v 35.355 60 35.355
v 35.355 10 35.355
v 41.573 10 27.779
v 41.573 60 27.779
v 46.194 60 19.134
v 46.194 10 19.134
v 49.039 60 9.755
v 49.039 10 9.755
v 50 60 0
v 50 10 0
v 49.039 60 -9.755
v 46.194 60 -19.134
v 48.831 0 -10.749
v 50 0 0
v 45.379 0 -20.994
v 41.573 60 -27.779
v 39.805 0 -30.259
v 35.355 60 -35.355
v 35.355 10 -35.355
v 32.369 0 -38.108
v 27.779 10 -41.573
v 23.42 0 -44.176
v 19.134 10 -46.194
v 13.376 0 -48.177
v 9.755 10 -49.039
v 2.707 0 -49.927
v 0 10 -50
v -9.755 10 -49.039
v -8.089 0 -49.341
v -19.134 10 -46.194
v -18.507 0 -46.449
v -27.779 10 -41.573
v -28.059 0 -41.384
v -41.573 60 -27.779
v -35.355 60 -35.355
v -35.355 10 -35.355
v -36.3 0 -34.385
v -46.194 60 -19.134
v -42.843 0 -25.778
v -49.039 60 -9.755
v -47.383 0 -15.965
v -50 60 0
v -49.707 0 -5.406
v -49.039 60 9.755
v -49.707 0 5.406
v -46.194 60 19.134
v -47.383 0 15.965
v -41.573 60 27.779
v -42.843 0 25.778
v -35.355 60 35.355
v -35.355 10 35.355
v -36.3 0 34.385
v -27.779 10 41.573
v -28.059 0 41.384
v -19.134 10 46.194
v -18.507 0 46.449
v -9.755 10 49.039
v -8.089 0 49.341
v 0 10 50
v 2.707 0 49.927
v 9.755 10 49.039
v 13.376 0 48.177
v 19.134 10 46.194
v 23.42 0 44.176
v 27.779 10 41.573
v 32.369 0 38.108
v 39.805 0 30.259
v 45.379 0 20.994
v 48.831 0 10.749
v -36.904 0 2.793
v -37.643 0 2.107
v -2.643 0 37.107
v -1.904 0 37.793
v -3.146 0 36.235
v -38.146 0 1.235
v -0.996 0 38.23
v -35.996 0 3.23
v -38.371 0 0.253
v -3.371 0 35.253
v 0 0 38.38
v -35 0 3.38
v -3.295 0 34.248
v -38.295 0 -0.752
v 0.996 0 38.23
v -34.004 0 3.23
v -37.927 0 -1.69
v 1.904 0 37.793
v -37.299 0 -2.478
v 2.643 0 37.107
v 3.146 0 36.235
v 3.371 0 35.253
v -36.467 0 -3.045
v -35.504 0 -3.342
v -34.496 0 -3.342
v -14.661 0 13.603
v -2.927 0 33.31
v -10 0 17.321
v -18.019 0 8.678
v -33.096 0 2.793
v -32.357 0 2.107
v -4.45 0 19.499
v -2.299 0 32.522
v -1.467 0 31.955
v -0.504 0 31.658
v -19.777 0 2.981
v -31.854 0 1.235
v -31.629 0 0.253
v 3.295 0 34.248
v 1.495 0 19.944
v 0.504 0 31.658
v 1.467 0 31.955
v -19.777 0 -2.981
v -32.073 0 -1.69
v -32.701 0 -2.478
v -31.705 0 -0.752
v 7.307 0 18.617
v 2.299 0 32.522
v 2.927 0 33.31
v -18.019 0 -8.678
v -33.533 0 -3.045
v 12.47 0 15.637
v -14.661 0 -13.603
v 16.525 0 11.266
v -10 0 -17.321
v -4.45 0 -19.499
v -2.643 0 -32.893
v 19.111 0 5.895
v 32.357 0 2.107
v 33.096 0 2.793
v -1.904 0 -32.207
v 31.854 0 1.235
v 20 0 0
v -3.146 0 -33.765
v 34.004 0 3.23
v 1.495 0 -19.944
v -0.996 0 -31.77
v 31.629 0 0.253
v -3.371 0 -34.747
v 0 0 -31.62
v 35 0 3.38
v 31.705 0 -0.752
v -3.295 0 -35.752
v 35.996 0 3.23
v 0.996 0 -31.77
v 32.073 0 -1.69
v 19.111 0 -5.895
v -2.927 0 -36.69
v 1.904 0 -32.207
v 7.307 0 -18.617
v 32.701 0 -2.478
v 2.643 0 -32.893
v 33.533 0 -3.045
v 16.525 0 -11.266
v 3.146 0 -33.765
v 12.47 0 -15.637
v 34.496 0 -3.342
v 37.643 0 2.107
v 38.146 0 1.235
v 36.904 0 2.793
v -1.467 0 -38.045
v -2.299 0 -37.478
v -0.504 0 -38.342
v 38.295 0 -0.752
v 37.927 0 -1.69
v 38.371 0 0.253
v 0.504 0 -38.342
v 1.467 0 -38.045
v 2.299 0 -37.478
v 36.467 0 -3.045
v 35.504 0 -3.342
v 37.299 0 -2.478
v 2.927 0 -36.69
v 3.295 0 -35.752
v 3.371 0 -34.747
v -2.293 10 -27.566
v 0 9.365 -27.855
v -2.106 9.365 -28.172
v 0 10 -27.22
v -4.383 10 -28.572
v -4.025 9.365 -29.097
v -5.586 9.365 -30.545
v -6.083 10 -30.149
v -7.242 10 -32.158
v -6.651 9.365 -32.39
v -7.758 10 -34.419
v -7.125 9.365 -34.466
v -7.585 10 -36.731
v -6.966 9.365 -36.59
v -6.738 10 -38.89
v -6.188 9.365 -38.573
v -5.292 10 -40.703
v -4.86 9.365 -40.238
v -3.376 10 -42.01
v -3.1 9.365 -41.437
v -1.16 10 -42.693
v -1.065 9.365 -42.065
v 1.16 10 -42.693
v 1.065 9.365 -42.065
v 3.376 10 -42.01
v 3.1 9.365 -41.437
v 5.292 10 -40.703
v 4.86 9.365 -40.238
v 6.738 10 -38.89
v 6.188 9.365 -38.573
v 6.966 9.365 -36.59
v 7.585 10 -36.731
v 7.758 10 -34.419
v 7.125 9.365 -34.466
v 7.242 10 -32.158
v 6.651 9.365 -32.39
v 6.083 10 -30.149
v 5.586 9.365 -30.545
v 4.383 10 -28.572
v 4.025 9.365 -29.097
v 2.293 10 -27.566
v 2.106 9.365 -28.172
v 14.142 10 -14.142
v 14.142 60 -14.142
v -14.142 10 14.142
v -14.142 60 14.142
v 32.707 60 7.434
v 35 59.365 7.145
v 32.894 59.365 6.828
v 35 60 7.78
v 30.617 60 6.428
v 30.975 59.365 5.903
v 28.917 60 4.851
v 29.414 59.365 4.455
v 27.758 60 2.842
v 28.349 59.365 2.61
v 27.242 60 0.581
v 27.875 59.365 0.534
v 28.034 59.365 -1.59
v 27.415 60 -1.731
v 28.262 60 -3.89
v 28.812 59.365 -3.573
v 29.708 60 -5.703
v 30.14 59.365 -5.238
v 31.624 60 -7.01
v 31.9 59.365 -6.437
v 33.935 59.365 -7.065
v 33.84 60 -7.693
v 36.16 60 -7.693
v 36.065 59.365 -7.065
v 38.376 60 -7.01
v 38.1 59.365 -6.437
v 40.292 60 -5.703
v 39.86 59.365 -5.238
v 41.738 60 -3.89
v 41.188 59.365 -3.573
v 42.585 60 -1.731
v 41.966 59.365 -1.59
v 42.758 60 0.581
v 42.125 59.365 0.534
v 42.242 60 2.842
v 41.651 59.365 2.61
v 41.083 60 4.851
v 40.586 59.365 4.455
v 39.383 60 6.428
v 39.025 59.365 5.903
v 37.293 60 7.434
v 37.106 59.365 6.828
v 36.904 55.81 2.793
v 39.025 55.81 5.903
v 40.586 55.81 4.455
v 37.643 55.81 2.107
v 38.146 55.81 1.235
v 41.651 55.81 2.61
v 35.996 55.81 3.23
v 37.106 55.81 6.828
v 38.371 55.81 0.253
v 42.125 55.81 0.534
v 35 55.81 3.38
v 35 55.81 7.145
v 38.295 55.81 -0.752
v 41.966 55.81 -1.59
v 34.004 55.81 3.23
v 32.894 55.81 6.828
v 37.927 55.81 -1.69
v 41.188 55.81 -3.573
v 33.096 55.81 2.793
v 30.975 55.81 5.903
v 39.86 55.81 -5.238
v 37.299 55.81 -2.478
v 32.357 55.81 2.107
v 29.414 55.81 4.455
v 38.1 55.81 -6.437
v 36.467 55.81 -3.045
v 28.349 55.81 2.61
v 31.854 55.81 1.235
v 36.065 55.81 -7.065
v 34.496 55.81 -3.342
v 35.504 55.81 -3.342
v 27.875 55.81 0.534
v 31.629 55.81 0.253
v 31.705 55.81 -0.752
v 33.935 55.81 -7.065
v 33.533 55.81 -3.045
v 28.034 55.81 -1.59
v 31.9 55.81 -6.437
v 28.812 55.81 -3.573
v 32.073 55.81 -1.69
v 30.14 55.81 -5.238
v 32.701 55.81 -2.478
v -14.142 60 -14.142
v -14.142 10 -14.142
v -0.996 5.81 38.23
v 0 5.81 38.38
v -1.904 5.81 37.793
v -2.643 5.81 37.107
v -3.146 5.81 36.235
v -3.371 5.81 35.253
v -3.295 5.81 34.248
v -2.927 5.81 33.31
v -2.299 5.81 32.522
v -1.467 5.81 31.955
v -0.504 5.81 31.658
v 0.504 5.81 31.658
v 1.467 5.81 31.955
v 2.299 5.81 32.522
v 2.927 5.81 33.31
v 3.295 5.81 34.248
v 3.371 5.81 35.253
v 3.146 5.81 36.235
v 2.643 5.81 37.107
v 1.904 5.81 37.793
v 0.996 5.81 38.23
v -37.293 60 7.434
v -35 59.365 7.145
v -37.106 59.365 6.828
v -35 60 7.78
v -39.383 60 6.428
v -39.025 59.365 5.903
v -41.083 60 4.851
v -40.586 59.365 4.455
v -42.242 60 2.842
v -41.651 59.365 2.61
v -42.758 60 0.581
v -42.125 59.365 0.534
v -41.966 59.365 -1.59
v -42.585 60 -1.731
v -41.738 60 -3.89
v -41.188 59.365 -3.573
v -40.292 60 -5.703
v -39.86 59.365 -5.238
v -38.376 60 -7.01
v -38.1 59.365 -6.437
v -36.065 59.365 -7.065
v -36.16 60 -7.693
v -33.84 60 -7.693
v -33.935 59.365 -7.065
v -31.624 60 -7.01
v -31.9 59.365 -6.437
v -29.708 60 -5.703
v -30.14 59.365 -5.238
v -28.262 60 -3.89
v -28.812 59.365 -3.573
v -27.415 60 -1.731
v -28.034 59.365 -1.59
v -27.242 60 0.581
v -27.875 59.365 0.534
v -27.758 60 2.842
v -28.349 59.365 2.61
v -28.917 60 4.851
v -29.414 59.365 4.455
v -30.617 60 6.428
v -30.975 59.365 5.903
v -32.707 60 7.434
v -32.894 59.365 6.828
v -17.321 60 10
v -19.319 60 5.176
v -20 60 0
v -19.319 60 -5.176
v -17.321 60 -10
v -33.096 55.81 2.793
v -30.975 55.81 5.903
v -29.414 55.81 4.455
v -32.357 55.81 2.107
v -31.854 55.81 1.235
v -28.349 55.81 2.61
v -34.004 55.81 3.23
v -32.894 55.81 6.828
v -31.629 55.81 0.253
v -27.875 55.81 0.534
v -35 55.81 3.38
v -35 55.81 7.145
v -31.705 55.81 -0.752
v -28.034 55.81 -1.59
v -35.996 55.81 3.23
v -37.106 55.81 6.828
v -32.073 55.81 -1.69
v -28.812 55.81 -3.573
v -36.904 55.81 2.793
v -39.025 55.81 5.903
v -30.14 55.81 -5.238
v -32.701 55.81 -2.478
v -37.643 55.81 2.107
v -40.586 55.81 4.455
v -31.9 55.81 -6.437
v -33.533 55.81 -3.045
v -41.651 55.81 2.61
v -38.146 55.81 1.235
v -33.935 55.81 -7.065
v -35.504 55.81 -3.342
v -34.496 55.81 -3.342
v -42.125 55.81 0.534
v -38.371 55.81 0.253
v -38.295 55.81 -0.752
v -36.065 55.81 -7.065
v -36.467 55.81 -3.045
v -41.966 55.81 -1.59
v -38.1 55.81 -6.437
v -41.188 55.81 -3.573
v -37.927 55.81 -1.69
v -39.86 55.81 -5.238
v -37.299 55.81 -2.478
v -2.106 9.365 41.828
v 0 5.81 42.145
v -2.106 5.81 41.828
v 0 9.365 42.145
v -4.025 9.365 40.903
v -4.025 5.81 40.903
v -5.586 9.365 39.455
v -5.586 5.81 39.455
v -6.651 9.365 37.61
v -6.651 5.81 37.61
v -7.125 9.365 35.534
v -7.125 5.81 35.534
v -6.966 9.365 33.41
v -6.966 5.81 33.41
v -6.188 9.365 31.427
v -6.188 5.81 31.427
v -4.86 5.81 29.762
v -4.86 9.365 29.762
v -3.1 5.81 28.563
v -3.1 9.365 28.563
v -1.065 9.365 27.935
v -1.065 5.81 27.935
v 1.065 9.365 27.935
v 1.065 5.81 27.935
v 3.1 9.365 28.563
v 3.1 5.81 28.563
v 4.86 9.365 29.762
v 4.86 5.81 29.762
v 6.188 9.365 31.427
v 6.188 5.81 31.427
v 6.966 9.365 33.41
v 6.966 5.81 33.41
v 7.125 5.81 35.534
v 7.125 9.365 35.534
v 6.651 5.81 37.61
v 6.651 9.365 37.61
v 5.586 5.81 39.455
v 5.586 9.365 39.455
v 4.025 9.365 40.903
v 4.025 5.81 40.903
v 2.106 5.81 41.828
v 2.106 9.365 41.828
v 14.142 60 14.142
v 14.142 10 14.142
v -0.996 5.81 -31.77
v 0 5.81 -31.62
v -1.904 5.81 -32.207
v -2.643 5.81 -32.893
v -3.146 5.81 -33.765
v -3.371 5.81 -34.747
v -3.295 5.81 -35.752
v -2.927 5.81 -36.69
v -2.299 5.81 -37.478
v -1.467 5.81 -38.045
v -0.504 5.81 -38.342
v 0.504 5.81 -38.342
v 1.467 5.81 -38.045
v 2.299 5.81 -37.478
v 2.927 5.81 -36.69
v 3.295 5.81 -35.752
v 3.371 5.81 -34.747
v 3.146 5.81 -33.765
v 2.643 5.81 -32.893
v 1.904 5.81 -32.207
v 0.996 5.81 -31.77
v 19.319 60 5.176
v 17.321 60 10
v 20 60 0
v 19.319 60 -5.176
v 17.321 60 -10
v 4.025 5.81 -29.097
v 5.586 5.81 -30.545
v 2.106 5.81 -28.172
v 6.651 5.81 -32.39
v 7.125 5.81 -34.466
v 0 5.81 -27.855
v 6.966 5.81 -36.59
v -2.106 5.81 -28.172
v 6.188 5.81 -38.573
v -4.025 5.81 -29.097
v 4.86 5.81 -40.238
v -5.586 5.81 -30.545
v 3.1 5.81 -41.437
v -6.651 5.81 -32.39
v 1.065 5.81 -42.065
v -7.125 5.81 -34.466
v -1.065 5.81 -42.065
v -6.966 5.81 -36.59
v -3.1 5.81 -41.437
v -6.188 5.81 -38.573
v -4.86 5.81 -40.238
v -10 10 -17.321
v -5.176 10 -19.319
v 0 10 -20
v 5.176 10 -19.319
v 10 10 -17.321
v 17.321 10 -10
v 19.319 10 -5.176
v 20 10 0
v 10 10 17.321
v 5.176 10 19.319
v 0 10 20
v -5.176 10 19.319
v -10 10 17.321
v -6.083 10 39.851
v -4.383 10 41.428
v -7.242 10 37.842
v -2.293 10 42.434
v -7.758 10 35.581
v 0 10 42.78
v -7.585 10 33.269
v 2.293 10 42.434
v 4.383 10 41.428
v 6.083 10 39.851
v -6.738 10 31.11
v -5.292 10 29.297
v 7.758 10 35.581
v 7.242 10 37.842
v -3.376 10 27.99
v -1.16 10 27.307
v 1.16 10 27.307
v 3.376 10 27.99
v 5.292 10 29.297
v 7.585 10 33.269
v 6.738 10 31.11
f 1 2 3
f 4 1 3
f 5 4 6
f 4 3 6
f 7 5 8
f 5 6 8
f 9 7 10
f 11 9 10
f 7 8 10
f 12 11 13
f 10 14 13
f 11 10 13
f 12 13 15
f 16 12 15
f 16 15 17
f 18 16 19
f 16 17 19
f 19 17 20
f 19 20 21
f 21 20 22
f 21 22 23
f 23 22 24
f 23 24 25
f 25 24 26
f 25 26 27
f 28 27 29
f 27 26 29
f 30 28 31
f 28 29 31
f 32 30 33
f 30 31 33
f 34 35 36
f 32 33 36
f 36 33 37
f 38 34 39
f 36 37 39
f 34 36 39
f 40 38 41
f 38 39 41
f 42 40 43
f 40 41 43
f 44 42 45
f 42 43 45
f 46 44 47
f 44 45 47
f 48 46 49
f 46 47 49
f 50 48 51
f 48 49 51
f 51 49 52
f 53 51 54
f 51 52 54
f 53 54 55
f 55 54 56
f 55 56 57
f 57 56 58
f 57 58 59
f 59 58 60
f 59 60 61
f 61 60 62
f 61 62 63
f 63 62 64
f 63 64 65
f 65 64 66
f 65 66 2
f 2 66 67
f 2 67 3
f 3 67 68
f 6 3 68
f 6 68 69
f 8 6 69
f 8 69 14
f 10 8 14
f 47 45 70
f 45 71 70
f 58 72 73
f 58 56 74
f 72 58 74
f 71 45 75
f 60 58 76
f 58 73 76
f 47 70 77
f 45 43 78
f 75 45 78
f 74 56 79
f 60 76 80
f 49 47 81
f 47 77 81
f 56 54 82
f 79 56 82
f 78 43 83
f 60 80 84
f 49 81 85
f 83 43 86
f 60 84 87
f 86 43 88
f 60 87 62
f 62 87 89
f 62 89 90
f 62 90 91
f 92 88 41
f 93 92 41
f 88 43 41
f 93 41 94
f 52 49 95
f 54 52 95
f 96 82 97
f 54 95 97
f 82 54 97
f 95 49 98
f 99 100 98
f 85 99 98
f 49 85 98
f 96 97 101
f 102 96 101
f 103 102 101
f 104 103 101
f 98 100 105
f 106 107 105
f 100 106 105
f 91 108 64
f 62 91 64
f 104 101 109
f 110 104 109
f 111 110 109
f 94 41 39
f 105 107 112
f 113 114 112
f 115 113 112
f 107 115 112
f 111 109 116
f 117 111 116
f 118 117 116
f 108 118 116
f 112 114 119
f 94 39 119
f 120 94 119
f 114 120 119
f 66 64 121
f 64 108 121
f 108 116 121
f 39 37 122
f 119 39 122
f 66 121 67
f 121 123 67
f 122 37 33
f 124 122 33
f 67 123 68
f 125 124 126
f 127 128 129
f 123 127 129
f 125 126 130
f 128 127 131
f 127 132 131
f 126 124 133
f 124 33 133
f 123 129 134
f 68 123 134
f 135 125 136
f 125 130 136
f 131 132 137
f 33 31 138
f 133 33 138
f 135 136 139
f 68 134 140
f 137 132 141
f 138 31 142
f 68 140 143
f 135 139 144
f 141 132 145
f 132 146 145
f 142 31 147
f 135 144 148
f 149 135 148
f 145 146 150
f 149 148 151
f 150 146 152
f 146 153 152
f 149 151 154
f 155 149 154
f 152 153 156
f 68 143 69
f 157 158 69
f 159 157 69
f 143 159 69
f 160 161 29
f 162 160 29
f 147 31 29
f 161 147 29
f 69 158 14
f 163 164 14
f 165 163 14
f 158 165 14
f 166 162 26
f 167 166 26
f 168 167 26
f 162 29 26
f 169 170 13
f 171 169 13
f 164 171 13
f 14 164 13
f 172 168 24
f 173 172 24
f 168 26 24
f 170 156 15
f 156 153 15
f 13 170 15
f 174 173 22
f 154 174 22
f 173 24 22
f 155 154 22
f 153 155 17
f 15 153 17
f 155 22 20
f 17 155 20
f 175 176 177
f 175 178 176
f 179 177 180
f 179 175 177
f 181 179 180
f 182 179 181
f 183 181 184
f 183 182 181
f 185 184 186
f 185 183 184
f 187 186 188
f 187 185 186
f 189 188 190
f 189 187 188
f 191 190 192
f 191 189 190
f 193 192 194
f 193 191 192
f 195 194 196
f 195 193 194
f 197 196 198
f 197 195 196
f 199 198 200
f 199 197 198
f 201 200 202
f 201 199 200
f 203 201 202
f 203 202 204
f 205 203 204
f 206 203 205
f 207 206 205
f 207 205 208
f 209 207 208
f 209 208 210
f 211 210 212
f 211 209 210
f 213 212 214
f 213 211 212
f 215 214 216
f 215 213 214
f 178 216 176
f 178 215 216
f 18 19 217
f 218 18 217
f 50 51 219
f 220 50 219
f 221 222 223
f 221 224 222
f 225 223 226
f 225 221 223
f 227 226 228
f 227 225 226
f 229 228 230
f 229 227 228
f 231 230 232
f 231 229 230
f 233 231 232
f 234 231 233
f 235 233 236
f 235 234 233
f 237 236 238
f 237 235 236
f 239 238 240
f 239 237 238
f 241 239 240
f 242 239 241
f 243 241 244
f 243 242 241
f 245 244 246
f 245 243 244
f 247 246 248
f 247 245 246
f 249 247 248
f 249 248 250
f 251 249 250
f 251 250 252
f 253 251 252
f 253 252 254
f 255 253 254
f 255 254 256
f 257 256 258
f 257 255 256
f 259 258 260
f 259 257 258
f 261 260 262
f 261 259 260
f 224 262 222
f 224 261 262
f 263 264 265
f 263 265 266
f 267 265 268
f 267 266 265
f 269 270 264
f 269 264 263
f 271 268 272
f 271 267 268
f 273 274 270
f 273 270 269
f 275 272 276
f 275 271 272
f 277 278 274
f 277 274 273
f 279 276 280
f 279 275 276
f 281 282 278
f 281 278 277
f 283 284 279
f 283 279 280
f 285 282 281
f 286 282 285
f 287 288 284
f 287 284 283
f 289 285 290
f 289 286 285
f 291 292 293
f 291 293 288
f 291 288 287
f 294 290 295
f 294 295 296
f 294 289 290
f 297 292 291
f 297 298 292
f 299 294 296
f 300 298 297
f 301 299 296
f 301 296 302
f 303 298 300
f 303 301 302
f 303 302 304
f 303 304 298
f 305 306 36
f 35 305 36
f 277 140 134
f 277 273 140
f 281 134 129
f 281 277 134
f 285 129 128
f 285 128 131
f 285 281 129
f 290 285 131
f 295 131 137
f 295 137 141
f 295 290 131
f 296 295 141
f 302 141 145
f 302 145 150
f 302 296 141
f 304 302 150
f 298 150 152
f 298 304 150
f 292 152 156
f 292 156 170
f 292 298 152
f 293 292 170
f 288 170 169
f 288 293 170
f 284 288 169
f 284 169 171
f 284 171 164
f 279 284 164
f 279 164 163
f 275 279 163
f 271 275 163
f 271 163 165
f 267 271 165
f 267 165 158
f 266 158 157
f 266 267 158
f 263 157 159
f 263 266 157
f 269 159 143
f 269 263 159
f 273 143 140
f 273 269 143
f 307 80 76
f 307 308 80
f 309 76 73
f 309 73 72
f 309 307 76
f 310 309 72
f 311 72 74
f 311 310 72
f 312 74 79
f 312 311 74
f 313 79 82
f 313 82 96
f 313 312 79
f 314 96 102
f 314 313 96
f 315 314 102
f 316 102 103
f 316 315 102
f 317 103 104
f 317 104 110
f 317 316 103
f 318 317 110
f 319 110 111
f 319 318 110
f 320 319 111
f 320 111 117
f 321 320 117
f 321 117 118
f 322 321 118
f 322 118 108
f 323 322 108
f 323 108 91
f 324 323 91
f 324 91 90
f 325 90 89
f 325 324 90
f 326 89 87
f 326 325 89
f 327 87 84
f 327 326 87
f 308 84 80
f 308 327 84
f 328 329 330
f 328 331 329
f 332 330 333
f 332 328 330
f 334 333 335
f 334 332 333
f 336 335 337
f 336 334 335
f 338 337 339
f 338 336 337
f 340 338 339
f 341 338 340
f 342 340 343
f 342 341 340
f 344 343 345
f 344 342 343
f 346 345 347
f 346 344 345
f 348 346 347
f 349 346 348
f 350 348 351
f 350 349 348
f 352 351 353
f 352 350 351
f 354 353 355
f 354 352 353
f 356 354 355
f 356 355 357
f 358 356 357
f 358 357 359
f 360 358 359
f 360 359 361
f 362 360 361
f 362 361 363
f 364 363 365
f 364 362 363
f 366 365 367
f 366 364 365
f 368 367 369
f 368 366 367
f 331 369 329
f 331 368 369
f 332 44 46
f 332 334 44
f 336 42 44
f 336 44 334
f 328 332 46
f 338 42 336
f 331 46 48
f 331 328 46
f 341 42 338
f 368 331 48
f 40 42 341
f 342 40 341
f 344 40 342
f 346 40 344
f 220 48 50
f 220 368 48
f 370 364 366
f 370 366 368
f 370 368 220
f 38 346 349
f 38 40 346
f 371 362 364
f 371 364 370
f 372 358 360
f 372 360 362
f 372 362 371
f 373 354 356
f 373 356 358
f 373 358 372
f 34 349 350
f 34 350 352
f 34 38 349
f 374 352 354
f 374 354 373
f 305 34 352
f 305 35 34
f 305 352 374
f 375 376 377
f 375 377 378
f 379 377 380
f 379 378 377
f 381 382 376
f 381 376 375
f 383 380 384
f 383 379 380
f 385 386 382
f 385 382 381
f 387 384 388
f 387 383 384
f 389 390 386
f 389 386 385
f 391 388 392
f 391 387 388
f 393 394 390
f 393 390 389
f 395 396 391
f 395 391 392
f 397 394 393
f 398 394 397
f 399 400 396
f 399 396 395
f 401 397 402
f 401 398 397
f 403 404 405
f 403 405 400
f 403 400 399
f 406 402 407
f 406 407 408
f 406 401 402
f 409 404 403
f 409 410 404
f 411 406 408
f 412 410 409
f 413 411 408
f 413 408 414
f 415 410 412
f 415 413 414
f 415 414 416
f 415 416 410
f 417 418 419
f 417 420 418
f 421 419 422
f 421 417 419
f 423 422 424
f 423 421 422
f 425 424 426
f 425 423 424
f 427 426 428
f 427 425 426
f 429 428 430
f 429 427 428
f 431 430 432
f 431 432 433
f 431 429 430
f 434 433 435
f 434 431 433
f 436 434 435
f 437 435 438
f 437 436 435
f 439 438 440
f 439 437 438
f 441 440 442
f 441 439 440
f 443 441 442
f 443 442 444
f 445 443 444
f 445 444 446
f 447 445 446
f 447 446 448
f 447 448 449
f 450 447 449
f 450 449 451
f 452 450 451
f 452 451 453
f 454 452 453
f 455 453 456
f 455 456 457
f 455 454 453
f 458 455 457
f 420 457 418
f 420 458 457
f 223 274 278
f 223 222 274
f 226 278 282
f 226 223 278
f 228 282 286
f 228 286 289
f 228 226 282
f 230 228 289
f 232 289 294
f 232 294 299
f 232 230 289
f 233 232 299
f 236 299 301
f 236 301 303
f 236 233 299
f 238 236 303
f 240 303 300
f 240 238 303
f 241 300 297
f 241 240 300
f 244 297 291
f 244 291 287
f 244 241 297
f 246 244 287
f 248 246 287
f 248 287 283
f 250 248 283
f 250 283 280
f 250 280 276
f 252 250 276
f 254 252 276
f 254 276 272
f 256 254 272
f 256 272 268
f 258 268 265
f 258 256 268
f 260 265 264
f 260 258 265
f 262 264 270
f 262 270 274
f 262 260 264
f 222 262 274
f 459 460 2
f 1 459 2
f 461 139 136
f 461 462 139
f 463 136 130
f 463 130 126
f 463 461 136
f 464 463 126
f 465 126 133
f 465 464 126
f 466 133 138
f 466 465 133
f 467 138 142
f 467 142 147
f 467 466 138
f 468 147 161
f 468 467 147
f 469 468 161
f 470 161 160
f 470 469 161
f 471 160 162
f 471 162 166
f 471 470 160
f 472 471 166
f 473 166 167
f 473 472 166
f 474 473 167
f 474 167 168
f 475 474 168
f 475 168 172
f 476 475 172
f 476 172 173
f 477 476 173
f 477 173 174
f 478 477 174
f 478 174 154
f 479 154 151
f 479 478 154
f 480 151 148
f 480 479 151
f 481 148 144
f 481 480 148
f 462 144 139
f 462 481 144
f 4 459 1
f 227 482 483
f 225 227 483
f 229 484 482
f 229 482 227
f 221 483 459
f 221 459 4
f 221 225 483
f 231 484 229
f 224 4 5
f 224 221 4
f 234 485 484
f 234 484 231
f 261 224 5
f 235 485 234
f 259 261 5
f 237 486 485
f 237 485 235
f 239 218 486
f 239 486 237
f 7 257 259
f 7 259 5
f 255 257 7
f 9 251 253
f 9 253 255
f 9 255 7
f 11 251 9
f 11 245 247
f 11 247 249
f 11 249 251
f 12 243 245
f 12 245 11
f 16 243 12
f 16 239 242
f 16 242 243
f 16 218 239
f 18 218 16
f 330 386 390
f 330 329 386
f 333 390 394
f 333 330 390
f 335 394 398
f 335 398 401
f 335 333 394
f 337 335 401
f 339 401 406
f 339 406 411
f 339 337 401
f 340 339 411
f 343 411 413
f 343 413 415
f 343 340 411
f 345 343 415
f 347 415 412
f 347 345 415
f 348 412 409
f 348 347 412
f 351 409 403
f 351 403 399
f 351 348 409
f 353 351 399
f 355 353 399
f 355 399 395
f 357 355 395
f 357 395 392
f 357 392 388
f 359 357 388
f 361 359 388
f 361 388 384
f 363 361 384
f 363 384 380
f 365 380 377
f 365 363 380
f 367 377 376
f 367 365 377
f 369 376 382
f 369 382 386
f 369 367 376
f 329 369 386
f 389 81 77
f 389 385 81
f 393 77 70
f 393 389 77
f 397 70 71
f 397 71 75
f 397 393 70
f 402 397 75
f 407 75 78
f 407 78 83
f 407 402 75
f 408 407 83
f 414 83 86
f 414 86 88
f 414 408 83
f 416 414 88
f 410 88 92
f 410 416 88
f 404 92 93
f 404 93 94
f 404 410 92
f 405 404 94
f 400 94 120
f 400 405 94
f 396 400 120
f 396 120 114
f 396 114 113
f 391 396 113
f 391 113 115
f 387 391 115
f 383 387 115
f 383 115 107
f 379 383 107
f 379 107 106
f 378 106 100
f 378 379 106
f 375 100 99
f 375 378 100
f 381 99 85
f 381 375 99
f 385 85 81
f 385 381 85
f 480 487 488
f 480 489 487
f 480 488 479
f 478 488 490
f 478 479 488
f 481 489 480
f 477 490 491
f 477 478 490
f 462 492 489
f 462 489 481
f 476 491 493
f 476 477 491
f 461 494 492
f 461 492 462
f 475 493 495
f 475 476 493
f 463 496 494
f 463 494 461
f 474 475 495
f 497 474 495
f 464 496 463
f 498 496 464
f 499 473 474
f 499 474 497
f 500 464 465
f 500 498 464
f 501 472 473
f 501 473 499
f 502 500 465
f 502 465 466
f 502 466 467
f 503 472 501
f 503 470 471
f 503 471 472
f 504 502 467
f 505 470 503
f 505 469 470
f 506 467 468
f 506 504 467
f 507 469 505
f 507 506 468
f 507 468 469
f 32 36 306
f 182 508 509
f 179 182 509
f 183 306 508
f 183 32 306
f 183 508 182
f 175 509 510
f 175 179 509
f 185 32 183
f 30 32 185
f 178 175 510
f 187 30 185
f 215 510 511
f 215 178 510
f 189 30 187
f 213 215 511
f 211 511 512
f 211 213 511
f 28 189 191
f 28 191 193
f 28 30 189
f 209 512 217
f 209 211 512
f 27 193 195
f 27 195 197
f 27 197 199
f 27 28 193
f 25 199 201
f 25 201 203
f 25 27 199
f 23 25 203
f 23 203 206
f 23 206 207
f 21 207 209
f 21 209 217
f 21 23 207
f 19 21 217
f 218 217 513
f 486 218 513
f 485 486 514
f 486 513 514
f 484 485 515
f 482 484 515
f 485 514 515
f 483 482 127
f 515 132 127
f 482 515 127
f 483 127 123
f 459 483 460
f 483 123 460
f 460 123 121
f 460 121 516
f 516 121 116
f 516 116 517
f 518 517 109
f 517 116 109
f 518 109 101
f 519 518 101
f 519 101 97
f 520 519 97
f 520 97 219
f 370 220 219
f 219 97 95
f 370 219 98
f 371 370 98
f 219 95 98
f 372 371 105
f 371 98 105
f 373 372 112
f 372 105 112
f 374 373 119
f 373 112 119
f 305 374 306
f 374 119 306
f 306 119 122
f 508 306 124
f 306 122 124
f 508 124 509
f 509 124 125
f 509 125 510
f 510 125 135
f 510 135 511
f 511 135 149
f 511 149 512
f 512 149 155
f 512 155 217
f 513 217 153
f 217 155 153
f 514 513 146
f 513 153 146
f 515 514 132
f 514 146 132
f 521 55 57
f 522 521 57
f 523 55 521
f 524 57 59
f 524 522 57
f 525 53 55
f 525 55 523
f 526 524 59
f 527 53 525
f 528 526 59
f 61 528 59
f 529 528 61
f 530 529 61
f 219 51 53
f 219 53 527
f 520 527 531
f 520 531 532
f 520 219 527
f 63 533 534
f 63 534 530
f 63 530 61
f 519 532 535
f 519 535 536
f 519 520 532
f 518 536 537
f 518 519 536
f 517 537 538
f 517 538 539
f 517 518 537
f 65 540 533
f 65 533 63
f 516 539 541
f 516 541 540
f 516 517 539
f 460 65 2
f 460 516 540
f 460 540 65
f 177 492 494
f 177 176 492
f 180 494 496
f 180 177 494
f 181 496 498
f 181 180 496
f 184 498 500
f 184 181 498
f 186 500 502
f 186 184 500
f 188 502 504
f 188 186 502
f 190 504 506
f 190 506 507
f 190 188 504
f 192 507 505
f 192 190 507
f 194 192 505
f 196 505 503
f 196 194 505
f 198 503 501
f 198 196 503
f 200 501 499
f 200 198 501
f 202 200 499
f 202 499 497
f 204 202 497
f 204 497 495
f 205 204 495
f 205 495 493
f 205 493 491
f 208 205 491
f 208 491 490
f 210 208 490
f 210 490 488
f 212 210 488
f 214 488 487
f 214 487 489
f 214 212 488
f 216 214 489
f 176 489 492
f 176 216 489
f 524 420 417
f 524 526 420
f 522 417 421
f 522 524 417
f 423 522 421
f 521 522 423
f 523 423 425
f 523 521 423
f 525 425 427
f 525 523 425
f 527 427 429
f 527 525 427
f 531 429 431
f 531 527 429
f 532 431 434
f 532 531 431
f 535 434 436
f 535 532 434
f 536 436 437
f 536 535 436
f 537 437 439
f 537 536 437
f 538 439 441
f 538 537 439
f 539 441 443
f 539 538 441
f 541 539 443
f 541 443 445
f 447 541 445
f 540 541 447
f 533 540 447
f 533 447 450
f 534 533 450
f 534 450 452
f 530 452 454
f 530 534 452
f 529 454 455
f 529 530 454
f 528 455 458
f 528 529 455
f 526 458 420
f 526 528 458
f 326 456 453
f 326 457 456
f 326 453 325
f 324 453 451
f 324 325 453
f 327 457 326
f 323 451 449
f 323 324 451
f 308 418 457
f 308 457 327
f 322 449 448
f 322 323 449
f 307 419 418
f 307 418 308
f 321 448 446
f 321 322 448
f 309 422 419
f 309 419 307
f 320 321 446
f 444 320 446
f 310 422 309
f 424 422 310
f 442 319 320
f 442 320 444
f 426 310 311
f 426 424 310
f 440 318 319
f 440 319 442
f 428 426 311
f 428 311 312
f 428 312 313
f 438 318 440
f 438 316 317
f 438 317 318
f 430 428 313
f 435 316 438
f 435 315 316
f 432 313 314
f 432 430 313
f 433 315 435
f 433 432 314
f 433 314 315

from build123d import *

# Parameters (mm, degrees)
SKETCH3_R                              = 50
BOSS_EXTRUDE1_DEPTH                    = 10
SKETCH4_R                              = 20
CUT_EXTRUDE3_DEPTH                     = 10
BOSS_EXTRUDE3_DEPTH                    = 50
CBORE_FOR_M6_HEX_HEAD_BOLT1_AT_2_COUNT = 2
CBORE_FOR_M6_HEX_HEAD_BOLT1_AT_2_PITCH = 70
CBORE_FOR_M6_HEX_HEAD_BOLT4_AT_2_COUNT = 2
CBORE_FOR_M6_HEX_HEAD_BOLT4_AT_2_PITCH = 70


with BuildPart() as part:
    # Sketch3 → Boss-Extrude1 (new body)
    with BuildSketch(Plane(origin=(0, 0, 0), x_dir=(1, 0, 0), z_dir=(0, 1, 0))):
        Circle(SKETCH3_R)
    extrude(amount=BOSS_EXTRUDE1_DEPTH)

    # Sketch4 → Cut-Extrude3 (cut)
    with BuildSketch(Plane(origin=(0, 10, 0), x_dir=(1, 0, 0), z_dir=(0, 1, 0))):
        Circle(SKETCH4_R)
    extrude(amount=-CUT_EXTRUDE3_DEPTH, mode=Mode.SUBTRACT)

    # Sketch5 → Boss-Extrude3 (add)
    with BuildSketch(Plane(origin=(0, 10, 0), x_dir=(1, 0, 0), z_dir=(0, 1, 0))):
        with BuildLine():
            ThreePointArc((14.142135624, 14.142135624), (20, 0), (14.142135624, -14.142135624))
            Line((14.142135624, -14.142135624), (35.355339059, -35.355339059))
            ThreePointArc((35.355339059, -35.355339059), (50, 0), (35.355339059, 35.355339059))
            Line((35.355339059, 35.355339059), (14.142135624, 14.142135624))
        make_face()
        with BuildLine():
            ThreePointArc((-14.142135624, -14.142135624), (-20, 0), (-14.142135624, 14.142135624))
            Line((-14.142135624, 14.142135624), (-35.355339059, 35.355339059))
            ThreePointArc((-35.355339059, 35.355339059), (-50, 0), (-35.355339059, -35.355339059))
            Line((-35.355339059, -35.355339059), (-14.142135624, -14.142135624))
        make_face()
    extrude(amount=BOSS_EXTRUDE3_DEPTH)

    # Sketch7 → CBORE for M6 Hex Head Bolt1 (revolve, cut)
    with BuildSketch(Plane(origin=(-35, 60, 0), x_dir=(0, 0, 1), z_dir=(1, 0, 0))):
        Polygon((0, 0), (0, 60), (3.38, 60), (3.38, 4.19), (7.145, 4.19), (7.145, 0.635), (7.78, 0), align=None)
    cbore_for_m6_hex_head_bolt1 = revolve(axis=Axis((-35, 66.35, 0), (0, -1, 0)), mode=Mode.SUBTRACT)

    # CBORE for M6 Hex Head Bolt1 at 2: CBORE for M6 Hex Head Bolt1 ×2
    with Locations(*[(i * CBORE_FOR_M6_HEX_HEAD_BOLT1_AT_2_PITCH, 0, 0) for i in range(1, CBORE_FOR_M6_HEX_HEAD_BOLT1_AT_2_COUNT)]):
        add(cbore_for_m6_hex_head_bolt1, mode=Mode.SUBTRACT)

    # Sketch17 → CBORE for M6 Hex Head Bolt4 (revolve, cut)
    with BuildSketch(Plane(origin=(0, 10, -35), x_dir=(0, 0, 1), z_dir=(1, 0, 0))):
        Polygon((0, 0), (0, 10), (3.38, 10), (3.38, 4.19), (7.145, 4.19), (7.145, 0.635), (7.78, 0), align=None)
    cbore_for_m6_hex_head_bolt4 = revolve(axis=Axis((0, 16.35, -35), (0, -1, 0)), mode=Mode.SUBTRACT)

    # CBORE for M6 Hex Head Bolt4 at 2: CBORE for M6 Hex Head Bolt4 ×2
    with Locations(*[(0, 0, i * CBORE_FOR_M6_HEX_HEAD_BOLT4_AT_2_PITCH) for i in range(1, CBORE_FOR_M6_HEX_HEAD_BOLT4_AT_2_COUNT)]):
        add(cbore_for_m6_hex_head_bolt4, mode=Mode.SUBTRACT)


solid = part.part
